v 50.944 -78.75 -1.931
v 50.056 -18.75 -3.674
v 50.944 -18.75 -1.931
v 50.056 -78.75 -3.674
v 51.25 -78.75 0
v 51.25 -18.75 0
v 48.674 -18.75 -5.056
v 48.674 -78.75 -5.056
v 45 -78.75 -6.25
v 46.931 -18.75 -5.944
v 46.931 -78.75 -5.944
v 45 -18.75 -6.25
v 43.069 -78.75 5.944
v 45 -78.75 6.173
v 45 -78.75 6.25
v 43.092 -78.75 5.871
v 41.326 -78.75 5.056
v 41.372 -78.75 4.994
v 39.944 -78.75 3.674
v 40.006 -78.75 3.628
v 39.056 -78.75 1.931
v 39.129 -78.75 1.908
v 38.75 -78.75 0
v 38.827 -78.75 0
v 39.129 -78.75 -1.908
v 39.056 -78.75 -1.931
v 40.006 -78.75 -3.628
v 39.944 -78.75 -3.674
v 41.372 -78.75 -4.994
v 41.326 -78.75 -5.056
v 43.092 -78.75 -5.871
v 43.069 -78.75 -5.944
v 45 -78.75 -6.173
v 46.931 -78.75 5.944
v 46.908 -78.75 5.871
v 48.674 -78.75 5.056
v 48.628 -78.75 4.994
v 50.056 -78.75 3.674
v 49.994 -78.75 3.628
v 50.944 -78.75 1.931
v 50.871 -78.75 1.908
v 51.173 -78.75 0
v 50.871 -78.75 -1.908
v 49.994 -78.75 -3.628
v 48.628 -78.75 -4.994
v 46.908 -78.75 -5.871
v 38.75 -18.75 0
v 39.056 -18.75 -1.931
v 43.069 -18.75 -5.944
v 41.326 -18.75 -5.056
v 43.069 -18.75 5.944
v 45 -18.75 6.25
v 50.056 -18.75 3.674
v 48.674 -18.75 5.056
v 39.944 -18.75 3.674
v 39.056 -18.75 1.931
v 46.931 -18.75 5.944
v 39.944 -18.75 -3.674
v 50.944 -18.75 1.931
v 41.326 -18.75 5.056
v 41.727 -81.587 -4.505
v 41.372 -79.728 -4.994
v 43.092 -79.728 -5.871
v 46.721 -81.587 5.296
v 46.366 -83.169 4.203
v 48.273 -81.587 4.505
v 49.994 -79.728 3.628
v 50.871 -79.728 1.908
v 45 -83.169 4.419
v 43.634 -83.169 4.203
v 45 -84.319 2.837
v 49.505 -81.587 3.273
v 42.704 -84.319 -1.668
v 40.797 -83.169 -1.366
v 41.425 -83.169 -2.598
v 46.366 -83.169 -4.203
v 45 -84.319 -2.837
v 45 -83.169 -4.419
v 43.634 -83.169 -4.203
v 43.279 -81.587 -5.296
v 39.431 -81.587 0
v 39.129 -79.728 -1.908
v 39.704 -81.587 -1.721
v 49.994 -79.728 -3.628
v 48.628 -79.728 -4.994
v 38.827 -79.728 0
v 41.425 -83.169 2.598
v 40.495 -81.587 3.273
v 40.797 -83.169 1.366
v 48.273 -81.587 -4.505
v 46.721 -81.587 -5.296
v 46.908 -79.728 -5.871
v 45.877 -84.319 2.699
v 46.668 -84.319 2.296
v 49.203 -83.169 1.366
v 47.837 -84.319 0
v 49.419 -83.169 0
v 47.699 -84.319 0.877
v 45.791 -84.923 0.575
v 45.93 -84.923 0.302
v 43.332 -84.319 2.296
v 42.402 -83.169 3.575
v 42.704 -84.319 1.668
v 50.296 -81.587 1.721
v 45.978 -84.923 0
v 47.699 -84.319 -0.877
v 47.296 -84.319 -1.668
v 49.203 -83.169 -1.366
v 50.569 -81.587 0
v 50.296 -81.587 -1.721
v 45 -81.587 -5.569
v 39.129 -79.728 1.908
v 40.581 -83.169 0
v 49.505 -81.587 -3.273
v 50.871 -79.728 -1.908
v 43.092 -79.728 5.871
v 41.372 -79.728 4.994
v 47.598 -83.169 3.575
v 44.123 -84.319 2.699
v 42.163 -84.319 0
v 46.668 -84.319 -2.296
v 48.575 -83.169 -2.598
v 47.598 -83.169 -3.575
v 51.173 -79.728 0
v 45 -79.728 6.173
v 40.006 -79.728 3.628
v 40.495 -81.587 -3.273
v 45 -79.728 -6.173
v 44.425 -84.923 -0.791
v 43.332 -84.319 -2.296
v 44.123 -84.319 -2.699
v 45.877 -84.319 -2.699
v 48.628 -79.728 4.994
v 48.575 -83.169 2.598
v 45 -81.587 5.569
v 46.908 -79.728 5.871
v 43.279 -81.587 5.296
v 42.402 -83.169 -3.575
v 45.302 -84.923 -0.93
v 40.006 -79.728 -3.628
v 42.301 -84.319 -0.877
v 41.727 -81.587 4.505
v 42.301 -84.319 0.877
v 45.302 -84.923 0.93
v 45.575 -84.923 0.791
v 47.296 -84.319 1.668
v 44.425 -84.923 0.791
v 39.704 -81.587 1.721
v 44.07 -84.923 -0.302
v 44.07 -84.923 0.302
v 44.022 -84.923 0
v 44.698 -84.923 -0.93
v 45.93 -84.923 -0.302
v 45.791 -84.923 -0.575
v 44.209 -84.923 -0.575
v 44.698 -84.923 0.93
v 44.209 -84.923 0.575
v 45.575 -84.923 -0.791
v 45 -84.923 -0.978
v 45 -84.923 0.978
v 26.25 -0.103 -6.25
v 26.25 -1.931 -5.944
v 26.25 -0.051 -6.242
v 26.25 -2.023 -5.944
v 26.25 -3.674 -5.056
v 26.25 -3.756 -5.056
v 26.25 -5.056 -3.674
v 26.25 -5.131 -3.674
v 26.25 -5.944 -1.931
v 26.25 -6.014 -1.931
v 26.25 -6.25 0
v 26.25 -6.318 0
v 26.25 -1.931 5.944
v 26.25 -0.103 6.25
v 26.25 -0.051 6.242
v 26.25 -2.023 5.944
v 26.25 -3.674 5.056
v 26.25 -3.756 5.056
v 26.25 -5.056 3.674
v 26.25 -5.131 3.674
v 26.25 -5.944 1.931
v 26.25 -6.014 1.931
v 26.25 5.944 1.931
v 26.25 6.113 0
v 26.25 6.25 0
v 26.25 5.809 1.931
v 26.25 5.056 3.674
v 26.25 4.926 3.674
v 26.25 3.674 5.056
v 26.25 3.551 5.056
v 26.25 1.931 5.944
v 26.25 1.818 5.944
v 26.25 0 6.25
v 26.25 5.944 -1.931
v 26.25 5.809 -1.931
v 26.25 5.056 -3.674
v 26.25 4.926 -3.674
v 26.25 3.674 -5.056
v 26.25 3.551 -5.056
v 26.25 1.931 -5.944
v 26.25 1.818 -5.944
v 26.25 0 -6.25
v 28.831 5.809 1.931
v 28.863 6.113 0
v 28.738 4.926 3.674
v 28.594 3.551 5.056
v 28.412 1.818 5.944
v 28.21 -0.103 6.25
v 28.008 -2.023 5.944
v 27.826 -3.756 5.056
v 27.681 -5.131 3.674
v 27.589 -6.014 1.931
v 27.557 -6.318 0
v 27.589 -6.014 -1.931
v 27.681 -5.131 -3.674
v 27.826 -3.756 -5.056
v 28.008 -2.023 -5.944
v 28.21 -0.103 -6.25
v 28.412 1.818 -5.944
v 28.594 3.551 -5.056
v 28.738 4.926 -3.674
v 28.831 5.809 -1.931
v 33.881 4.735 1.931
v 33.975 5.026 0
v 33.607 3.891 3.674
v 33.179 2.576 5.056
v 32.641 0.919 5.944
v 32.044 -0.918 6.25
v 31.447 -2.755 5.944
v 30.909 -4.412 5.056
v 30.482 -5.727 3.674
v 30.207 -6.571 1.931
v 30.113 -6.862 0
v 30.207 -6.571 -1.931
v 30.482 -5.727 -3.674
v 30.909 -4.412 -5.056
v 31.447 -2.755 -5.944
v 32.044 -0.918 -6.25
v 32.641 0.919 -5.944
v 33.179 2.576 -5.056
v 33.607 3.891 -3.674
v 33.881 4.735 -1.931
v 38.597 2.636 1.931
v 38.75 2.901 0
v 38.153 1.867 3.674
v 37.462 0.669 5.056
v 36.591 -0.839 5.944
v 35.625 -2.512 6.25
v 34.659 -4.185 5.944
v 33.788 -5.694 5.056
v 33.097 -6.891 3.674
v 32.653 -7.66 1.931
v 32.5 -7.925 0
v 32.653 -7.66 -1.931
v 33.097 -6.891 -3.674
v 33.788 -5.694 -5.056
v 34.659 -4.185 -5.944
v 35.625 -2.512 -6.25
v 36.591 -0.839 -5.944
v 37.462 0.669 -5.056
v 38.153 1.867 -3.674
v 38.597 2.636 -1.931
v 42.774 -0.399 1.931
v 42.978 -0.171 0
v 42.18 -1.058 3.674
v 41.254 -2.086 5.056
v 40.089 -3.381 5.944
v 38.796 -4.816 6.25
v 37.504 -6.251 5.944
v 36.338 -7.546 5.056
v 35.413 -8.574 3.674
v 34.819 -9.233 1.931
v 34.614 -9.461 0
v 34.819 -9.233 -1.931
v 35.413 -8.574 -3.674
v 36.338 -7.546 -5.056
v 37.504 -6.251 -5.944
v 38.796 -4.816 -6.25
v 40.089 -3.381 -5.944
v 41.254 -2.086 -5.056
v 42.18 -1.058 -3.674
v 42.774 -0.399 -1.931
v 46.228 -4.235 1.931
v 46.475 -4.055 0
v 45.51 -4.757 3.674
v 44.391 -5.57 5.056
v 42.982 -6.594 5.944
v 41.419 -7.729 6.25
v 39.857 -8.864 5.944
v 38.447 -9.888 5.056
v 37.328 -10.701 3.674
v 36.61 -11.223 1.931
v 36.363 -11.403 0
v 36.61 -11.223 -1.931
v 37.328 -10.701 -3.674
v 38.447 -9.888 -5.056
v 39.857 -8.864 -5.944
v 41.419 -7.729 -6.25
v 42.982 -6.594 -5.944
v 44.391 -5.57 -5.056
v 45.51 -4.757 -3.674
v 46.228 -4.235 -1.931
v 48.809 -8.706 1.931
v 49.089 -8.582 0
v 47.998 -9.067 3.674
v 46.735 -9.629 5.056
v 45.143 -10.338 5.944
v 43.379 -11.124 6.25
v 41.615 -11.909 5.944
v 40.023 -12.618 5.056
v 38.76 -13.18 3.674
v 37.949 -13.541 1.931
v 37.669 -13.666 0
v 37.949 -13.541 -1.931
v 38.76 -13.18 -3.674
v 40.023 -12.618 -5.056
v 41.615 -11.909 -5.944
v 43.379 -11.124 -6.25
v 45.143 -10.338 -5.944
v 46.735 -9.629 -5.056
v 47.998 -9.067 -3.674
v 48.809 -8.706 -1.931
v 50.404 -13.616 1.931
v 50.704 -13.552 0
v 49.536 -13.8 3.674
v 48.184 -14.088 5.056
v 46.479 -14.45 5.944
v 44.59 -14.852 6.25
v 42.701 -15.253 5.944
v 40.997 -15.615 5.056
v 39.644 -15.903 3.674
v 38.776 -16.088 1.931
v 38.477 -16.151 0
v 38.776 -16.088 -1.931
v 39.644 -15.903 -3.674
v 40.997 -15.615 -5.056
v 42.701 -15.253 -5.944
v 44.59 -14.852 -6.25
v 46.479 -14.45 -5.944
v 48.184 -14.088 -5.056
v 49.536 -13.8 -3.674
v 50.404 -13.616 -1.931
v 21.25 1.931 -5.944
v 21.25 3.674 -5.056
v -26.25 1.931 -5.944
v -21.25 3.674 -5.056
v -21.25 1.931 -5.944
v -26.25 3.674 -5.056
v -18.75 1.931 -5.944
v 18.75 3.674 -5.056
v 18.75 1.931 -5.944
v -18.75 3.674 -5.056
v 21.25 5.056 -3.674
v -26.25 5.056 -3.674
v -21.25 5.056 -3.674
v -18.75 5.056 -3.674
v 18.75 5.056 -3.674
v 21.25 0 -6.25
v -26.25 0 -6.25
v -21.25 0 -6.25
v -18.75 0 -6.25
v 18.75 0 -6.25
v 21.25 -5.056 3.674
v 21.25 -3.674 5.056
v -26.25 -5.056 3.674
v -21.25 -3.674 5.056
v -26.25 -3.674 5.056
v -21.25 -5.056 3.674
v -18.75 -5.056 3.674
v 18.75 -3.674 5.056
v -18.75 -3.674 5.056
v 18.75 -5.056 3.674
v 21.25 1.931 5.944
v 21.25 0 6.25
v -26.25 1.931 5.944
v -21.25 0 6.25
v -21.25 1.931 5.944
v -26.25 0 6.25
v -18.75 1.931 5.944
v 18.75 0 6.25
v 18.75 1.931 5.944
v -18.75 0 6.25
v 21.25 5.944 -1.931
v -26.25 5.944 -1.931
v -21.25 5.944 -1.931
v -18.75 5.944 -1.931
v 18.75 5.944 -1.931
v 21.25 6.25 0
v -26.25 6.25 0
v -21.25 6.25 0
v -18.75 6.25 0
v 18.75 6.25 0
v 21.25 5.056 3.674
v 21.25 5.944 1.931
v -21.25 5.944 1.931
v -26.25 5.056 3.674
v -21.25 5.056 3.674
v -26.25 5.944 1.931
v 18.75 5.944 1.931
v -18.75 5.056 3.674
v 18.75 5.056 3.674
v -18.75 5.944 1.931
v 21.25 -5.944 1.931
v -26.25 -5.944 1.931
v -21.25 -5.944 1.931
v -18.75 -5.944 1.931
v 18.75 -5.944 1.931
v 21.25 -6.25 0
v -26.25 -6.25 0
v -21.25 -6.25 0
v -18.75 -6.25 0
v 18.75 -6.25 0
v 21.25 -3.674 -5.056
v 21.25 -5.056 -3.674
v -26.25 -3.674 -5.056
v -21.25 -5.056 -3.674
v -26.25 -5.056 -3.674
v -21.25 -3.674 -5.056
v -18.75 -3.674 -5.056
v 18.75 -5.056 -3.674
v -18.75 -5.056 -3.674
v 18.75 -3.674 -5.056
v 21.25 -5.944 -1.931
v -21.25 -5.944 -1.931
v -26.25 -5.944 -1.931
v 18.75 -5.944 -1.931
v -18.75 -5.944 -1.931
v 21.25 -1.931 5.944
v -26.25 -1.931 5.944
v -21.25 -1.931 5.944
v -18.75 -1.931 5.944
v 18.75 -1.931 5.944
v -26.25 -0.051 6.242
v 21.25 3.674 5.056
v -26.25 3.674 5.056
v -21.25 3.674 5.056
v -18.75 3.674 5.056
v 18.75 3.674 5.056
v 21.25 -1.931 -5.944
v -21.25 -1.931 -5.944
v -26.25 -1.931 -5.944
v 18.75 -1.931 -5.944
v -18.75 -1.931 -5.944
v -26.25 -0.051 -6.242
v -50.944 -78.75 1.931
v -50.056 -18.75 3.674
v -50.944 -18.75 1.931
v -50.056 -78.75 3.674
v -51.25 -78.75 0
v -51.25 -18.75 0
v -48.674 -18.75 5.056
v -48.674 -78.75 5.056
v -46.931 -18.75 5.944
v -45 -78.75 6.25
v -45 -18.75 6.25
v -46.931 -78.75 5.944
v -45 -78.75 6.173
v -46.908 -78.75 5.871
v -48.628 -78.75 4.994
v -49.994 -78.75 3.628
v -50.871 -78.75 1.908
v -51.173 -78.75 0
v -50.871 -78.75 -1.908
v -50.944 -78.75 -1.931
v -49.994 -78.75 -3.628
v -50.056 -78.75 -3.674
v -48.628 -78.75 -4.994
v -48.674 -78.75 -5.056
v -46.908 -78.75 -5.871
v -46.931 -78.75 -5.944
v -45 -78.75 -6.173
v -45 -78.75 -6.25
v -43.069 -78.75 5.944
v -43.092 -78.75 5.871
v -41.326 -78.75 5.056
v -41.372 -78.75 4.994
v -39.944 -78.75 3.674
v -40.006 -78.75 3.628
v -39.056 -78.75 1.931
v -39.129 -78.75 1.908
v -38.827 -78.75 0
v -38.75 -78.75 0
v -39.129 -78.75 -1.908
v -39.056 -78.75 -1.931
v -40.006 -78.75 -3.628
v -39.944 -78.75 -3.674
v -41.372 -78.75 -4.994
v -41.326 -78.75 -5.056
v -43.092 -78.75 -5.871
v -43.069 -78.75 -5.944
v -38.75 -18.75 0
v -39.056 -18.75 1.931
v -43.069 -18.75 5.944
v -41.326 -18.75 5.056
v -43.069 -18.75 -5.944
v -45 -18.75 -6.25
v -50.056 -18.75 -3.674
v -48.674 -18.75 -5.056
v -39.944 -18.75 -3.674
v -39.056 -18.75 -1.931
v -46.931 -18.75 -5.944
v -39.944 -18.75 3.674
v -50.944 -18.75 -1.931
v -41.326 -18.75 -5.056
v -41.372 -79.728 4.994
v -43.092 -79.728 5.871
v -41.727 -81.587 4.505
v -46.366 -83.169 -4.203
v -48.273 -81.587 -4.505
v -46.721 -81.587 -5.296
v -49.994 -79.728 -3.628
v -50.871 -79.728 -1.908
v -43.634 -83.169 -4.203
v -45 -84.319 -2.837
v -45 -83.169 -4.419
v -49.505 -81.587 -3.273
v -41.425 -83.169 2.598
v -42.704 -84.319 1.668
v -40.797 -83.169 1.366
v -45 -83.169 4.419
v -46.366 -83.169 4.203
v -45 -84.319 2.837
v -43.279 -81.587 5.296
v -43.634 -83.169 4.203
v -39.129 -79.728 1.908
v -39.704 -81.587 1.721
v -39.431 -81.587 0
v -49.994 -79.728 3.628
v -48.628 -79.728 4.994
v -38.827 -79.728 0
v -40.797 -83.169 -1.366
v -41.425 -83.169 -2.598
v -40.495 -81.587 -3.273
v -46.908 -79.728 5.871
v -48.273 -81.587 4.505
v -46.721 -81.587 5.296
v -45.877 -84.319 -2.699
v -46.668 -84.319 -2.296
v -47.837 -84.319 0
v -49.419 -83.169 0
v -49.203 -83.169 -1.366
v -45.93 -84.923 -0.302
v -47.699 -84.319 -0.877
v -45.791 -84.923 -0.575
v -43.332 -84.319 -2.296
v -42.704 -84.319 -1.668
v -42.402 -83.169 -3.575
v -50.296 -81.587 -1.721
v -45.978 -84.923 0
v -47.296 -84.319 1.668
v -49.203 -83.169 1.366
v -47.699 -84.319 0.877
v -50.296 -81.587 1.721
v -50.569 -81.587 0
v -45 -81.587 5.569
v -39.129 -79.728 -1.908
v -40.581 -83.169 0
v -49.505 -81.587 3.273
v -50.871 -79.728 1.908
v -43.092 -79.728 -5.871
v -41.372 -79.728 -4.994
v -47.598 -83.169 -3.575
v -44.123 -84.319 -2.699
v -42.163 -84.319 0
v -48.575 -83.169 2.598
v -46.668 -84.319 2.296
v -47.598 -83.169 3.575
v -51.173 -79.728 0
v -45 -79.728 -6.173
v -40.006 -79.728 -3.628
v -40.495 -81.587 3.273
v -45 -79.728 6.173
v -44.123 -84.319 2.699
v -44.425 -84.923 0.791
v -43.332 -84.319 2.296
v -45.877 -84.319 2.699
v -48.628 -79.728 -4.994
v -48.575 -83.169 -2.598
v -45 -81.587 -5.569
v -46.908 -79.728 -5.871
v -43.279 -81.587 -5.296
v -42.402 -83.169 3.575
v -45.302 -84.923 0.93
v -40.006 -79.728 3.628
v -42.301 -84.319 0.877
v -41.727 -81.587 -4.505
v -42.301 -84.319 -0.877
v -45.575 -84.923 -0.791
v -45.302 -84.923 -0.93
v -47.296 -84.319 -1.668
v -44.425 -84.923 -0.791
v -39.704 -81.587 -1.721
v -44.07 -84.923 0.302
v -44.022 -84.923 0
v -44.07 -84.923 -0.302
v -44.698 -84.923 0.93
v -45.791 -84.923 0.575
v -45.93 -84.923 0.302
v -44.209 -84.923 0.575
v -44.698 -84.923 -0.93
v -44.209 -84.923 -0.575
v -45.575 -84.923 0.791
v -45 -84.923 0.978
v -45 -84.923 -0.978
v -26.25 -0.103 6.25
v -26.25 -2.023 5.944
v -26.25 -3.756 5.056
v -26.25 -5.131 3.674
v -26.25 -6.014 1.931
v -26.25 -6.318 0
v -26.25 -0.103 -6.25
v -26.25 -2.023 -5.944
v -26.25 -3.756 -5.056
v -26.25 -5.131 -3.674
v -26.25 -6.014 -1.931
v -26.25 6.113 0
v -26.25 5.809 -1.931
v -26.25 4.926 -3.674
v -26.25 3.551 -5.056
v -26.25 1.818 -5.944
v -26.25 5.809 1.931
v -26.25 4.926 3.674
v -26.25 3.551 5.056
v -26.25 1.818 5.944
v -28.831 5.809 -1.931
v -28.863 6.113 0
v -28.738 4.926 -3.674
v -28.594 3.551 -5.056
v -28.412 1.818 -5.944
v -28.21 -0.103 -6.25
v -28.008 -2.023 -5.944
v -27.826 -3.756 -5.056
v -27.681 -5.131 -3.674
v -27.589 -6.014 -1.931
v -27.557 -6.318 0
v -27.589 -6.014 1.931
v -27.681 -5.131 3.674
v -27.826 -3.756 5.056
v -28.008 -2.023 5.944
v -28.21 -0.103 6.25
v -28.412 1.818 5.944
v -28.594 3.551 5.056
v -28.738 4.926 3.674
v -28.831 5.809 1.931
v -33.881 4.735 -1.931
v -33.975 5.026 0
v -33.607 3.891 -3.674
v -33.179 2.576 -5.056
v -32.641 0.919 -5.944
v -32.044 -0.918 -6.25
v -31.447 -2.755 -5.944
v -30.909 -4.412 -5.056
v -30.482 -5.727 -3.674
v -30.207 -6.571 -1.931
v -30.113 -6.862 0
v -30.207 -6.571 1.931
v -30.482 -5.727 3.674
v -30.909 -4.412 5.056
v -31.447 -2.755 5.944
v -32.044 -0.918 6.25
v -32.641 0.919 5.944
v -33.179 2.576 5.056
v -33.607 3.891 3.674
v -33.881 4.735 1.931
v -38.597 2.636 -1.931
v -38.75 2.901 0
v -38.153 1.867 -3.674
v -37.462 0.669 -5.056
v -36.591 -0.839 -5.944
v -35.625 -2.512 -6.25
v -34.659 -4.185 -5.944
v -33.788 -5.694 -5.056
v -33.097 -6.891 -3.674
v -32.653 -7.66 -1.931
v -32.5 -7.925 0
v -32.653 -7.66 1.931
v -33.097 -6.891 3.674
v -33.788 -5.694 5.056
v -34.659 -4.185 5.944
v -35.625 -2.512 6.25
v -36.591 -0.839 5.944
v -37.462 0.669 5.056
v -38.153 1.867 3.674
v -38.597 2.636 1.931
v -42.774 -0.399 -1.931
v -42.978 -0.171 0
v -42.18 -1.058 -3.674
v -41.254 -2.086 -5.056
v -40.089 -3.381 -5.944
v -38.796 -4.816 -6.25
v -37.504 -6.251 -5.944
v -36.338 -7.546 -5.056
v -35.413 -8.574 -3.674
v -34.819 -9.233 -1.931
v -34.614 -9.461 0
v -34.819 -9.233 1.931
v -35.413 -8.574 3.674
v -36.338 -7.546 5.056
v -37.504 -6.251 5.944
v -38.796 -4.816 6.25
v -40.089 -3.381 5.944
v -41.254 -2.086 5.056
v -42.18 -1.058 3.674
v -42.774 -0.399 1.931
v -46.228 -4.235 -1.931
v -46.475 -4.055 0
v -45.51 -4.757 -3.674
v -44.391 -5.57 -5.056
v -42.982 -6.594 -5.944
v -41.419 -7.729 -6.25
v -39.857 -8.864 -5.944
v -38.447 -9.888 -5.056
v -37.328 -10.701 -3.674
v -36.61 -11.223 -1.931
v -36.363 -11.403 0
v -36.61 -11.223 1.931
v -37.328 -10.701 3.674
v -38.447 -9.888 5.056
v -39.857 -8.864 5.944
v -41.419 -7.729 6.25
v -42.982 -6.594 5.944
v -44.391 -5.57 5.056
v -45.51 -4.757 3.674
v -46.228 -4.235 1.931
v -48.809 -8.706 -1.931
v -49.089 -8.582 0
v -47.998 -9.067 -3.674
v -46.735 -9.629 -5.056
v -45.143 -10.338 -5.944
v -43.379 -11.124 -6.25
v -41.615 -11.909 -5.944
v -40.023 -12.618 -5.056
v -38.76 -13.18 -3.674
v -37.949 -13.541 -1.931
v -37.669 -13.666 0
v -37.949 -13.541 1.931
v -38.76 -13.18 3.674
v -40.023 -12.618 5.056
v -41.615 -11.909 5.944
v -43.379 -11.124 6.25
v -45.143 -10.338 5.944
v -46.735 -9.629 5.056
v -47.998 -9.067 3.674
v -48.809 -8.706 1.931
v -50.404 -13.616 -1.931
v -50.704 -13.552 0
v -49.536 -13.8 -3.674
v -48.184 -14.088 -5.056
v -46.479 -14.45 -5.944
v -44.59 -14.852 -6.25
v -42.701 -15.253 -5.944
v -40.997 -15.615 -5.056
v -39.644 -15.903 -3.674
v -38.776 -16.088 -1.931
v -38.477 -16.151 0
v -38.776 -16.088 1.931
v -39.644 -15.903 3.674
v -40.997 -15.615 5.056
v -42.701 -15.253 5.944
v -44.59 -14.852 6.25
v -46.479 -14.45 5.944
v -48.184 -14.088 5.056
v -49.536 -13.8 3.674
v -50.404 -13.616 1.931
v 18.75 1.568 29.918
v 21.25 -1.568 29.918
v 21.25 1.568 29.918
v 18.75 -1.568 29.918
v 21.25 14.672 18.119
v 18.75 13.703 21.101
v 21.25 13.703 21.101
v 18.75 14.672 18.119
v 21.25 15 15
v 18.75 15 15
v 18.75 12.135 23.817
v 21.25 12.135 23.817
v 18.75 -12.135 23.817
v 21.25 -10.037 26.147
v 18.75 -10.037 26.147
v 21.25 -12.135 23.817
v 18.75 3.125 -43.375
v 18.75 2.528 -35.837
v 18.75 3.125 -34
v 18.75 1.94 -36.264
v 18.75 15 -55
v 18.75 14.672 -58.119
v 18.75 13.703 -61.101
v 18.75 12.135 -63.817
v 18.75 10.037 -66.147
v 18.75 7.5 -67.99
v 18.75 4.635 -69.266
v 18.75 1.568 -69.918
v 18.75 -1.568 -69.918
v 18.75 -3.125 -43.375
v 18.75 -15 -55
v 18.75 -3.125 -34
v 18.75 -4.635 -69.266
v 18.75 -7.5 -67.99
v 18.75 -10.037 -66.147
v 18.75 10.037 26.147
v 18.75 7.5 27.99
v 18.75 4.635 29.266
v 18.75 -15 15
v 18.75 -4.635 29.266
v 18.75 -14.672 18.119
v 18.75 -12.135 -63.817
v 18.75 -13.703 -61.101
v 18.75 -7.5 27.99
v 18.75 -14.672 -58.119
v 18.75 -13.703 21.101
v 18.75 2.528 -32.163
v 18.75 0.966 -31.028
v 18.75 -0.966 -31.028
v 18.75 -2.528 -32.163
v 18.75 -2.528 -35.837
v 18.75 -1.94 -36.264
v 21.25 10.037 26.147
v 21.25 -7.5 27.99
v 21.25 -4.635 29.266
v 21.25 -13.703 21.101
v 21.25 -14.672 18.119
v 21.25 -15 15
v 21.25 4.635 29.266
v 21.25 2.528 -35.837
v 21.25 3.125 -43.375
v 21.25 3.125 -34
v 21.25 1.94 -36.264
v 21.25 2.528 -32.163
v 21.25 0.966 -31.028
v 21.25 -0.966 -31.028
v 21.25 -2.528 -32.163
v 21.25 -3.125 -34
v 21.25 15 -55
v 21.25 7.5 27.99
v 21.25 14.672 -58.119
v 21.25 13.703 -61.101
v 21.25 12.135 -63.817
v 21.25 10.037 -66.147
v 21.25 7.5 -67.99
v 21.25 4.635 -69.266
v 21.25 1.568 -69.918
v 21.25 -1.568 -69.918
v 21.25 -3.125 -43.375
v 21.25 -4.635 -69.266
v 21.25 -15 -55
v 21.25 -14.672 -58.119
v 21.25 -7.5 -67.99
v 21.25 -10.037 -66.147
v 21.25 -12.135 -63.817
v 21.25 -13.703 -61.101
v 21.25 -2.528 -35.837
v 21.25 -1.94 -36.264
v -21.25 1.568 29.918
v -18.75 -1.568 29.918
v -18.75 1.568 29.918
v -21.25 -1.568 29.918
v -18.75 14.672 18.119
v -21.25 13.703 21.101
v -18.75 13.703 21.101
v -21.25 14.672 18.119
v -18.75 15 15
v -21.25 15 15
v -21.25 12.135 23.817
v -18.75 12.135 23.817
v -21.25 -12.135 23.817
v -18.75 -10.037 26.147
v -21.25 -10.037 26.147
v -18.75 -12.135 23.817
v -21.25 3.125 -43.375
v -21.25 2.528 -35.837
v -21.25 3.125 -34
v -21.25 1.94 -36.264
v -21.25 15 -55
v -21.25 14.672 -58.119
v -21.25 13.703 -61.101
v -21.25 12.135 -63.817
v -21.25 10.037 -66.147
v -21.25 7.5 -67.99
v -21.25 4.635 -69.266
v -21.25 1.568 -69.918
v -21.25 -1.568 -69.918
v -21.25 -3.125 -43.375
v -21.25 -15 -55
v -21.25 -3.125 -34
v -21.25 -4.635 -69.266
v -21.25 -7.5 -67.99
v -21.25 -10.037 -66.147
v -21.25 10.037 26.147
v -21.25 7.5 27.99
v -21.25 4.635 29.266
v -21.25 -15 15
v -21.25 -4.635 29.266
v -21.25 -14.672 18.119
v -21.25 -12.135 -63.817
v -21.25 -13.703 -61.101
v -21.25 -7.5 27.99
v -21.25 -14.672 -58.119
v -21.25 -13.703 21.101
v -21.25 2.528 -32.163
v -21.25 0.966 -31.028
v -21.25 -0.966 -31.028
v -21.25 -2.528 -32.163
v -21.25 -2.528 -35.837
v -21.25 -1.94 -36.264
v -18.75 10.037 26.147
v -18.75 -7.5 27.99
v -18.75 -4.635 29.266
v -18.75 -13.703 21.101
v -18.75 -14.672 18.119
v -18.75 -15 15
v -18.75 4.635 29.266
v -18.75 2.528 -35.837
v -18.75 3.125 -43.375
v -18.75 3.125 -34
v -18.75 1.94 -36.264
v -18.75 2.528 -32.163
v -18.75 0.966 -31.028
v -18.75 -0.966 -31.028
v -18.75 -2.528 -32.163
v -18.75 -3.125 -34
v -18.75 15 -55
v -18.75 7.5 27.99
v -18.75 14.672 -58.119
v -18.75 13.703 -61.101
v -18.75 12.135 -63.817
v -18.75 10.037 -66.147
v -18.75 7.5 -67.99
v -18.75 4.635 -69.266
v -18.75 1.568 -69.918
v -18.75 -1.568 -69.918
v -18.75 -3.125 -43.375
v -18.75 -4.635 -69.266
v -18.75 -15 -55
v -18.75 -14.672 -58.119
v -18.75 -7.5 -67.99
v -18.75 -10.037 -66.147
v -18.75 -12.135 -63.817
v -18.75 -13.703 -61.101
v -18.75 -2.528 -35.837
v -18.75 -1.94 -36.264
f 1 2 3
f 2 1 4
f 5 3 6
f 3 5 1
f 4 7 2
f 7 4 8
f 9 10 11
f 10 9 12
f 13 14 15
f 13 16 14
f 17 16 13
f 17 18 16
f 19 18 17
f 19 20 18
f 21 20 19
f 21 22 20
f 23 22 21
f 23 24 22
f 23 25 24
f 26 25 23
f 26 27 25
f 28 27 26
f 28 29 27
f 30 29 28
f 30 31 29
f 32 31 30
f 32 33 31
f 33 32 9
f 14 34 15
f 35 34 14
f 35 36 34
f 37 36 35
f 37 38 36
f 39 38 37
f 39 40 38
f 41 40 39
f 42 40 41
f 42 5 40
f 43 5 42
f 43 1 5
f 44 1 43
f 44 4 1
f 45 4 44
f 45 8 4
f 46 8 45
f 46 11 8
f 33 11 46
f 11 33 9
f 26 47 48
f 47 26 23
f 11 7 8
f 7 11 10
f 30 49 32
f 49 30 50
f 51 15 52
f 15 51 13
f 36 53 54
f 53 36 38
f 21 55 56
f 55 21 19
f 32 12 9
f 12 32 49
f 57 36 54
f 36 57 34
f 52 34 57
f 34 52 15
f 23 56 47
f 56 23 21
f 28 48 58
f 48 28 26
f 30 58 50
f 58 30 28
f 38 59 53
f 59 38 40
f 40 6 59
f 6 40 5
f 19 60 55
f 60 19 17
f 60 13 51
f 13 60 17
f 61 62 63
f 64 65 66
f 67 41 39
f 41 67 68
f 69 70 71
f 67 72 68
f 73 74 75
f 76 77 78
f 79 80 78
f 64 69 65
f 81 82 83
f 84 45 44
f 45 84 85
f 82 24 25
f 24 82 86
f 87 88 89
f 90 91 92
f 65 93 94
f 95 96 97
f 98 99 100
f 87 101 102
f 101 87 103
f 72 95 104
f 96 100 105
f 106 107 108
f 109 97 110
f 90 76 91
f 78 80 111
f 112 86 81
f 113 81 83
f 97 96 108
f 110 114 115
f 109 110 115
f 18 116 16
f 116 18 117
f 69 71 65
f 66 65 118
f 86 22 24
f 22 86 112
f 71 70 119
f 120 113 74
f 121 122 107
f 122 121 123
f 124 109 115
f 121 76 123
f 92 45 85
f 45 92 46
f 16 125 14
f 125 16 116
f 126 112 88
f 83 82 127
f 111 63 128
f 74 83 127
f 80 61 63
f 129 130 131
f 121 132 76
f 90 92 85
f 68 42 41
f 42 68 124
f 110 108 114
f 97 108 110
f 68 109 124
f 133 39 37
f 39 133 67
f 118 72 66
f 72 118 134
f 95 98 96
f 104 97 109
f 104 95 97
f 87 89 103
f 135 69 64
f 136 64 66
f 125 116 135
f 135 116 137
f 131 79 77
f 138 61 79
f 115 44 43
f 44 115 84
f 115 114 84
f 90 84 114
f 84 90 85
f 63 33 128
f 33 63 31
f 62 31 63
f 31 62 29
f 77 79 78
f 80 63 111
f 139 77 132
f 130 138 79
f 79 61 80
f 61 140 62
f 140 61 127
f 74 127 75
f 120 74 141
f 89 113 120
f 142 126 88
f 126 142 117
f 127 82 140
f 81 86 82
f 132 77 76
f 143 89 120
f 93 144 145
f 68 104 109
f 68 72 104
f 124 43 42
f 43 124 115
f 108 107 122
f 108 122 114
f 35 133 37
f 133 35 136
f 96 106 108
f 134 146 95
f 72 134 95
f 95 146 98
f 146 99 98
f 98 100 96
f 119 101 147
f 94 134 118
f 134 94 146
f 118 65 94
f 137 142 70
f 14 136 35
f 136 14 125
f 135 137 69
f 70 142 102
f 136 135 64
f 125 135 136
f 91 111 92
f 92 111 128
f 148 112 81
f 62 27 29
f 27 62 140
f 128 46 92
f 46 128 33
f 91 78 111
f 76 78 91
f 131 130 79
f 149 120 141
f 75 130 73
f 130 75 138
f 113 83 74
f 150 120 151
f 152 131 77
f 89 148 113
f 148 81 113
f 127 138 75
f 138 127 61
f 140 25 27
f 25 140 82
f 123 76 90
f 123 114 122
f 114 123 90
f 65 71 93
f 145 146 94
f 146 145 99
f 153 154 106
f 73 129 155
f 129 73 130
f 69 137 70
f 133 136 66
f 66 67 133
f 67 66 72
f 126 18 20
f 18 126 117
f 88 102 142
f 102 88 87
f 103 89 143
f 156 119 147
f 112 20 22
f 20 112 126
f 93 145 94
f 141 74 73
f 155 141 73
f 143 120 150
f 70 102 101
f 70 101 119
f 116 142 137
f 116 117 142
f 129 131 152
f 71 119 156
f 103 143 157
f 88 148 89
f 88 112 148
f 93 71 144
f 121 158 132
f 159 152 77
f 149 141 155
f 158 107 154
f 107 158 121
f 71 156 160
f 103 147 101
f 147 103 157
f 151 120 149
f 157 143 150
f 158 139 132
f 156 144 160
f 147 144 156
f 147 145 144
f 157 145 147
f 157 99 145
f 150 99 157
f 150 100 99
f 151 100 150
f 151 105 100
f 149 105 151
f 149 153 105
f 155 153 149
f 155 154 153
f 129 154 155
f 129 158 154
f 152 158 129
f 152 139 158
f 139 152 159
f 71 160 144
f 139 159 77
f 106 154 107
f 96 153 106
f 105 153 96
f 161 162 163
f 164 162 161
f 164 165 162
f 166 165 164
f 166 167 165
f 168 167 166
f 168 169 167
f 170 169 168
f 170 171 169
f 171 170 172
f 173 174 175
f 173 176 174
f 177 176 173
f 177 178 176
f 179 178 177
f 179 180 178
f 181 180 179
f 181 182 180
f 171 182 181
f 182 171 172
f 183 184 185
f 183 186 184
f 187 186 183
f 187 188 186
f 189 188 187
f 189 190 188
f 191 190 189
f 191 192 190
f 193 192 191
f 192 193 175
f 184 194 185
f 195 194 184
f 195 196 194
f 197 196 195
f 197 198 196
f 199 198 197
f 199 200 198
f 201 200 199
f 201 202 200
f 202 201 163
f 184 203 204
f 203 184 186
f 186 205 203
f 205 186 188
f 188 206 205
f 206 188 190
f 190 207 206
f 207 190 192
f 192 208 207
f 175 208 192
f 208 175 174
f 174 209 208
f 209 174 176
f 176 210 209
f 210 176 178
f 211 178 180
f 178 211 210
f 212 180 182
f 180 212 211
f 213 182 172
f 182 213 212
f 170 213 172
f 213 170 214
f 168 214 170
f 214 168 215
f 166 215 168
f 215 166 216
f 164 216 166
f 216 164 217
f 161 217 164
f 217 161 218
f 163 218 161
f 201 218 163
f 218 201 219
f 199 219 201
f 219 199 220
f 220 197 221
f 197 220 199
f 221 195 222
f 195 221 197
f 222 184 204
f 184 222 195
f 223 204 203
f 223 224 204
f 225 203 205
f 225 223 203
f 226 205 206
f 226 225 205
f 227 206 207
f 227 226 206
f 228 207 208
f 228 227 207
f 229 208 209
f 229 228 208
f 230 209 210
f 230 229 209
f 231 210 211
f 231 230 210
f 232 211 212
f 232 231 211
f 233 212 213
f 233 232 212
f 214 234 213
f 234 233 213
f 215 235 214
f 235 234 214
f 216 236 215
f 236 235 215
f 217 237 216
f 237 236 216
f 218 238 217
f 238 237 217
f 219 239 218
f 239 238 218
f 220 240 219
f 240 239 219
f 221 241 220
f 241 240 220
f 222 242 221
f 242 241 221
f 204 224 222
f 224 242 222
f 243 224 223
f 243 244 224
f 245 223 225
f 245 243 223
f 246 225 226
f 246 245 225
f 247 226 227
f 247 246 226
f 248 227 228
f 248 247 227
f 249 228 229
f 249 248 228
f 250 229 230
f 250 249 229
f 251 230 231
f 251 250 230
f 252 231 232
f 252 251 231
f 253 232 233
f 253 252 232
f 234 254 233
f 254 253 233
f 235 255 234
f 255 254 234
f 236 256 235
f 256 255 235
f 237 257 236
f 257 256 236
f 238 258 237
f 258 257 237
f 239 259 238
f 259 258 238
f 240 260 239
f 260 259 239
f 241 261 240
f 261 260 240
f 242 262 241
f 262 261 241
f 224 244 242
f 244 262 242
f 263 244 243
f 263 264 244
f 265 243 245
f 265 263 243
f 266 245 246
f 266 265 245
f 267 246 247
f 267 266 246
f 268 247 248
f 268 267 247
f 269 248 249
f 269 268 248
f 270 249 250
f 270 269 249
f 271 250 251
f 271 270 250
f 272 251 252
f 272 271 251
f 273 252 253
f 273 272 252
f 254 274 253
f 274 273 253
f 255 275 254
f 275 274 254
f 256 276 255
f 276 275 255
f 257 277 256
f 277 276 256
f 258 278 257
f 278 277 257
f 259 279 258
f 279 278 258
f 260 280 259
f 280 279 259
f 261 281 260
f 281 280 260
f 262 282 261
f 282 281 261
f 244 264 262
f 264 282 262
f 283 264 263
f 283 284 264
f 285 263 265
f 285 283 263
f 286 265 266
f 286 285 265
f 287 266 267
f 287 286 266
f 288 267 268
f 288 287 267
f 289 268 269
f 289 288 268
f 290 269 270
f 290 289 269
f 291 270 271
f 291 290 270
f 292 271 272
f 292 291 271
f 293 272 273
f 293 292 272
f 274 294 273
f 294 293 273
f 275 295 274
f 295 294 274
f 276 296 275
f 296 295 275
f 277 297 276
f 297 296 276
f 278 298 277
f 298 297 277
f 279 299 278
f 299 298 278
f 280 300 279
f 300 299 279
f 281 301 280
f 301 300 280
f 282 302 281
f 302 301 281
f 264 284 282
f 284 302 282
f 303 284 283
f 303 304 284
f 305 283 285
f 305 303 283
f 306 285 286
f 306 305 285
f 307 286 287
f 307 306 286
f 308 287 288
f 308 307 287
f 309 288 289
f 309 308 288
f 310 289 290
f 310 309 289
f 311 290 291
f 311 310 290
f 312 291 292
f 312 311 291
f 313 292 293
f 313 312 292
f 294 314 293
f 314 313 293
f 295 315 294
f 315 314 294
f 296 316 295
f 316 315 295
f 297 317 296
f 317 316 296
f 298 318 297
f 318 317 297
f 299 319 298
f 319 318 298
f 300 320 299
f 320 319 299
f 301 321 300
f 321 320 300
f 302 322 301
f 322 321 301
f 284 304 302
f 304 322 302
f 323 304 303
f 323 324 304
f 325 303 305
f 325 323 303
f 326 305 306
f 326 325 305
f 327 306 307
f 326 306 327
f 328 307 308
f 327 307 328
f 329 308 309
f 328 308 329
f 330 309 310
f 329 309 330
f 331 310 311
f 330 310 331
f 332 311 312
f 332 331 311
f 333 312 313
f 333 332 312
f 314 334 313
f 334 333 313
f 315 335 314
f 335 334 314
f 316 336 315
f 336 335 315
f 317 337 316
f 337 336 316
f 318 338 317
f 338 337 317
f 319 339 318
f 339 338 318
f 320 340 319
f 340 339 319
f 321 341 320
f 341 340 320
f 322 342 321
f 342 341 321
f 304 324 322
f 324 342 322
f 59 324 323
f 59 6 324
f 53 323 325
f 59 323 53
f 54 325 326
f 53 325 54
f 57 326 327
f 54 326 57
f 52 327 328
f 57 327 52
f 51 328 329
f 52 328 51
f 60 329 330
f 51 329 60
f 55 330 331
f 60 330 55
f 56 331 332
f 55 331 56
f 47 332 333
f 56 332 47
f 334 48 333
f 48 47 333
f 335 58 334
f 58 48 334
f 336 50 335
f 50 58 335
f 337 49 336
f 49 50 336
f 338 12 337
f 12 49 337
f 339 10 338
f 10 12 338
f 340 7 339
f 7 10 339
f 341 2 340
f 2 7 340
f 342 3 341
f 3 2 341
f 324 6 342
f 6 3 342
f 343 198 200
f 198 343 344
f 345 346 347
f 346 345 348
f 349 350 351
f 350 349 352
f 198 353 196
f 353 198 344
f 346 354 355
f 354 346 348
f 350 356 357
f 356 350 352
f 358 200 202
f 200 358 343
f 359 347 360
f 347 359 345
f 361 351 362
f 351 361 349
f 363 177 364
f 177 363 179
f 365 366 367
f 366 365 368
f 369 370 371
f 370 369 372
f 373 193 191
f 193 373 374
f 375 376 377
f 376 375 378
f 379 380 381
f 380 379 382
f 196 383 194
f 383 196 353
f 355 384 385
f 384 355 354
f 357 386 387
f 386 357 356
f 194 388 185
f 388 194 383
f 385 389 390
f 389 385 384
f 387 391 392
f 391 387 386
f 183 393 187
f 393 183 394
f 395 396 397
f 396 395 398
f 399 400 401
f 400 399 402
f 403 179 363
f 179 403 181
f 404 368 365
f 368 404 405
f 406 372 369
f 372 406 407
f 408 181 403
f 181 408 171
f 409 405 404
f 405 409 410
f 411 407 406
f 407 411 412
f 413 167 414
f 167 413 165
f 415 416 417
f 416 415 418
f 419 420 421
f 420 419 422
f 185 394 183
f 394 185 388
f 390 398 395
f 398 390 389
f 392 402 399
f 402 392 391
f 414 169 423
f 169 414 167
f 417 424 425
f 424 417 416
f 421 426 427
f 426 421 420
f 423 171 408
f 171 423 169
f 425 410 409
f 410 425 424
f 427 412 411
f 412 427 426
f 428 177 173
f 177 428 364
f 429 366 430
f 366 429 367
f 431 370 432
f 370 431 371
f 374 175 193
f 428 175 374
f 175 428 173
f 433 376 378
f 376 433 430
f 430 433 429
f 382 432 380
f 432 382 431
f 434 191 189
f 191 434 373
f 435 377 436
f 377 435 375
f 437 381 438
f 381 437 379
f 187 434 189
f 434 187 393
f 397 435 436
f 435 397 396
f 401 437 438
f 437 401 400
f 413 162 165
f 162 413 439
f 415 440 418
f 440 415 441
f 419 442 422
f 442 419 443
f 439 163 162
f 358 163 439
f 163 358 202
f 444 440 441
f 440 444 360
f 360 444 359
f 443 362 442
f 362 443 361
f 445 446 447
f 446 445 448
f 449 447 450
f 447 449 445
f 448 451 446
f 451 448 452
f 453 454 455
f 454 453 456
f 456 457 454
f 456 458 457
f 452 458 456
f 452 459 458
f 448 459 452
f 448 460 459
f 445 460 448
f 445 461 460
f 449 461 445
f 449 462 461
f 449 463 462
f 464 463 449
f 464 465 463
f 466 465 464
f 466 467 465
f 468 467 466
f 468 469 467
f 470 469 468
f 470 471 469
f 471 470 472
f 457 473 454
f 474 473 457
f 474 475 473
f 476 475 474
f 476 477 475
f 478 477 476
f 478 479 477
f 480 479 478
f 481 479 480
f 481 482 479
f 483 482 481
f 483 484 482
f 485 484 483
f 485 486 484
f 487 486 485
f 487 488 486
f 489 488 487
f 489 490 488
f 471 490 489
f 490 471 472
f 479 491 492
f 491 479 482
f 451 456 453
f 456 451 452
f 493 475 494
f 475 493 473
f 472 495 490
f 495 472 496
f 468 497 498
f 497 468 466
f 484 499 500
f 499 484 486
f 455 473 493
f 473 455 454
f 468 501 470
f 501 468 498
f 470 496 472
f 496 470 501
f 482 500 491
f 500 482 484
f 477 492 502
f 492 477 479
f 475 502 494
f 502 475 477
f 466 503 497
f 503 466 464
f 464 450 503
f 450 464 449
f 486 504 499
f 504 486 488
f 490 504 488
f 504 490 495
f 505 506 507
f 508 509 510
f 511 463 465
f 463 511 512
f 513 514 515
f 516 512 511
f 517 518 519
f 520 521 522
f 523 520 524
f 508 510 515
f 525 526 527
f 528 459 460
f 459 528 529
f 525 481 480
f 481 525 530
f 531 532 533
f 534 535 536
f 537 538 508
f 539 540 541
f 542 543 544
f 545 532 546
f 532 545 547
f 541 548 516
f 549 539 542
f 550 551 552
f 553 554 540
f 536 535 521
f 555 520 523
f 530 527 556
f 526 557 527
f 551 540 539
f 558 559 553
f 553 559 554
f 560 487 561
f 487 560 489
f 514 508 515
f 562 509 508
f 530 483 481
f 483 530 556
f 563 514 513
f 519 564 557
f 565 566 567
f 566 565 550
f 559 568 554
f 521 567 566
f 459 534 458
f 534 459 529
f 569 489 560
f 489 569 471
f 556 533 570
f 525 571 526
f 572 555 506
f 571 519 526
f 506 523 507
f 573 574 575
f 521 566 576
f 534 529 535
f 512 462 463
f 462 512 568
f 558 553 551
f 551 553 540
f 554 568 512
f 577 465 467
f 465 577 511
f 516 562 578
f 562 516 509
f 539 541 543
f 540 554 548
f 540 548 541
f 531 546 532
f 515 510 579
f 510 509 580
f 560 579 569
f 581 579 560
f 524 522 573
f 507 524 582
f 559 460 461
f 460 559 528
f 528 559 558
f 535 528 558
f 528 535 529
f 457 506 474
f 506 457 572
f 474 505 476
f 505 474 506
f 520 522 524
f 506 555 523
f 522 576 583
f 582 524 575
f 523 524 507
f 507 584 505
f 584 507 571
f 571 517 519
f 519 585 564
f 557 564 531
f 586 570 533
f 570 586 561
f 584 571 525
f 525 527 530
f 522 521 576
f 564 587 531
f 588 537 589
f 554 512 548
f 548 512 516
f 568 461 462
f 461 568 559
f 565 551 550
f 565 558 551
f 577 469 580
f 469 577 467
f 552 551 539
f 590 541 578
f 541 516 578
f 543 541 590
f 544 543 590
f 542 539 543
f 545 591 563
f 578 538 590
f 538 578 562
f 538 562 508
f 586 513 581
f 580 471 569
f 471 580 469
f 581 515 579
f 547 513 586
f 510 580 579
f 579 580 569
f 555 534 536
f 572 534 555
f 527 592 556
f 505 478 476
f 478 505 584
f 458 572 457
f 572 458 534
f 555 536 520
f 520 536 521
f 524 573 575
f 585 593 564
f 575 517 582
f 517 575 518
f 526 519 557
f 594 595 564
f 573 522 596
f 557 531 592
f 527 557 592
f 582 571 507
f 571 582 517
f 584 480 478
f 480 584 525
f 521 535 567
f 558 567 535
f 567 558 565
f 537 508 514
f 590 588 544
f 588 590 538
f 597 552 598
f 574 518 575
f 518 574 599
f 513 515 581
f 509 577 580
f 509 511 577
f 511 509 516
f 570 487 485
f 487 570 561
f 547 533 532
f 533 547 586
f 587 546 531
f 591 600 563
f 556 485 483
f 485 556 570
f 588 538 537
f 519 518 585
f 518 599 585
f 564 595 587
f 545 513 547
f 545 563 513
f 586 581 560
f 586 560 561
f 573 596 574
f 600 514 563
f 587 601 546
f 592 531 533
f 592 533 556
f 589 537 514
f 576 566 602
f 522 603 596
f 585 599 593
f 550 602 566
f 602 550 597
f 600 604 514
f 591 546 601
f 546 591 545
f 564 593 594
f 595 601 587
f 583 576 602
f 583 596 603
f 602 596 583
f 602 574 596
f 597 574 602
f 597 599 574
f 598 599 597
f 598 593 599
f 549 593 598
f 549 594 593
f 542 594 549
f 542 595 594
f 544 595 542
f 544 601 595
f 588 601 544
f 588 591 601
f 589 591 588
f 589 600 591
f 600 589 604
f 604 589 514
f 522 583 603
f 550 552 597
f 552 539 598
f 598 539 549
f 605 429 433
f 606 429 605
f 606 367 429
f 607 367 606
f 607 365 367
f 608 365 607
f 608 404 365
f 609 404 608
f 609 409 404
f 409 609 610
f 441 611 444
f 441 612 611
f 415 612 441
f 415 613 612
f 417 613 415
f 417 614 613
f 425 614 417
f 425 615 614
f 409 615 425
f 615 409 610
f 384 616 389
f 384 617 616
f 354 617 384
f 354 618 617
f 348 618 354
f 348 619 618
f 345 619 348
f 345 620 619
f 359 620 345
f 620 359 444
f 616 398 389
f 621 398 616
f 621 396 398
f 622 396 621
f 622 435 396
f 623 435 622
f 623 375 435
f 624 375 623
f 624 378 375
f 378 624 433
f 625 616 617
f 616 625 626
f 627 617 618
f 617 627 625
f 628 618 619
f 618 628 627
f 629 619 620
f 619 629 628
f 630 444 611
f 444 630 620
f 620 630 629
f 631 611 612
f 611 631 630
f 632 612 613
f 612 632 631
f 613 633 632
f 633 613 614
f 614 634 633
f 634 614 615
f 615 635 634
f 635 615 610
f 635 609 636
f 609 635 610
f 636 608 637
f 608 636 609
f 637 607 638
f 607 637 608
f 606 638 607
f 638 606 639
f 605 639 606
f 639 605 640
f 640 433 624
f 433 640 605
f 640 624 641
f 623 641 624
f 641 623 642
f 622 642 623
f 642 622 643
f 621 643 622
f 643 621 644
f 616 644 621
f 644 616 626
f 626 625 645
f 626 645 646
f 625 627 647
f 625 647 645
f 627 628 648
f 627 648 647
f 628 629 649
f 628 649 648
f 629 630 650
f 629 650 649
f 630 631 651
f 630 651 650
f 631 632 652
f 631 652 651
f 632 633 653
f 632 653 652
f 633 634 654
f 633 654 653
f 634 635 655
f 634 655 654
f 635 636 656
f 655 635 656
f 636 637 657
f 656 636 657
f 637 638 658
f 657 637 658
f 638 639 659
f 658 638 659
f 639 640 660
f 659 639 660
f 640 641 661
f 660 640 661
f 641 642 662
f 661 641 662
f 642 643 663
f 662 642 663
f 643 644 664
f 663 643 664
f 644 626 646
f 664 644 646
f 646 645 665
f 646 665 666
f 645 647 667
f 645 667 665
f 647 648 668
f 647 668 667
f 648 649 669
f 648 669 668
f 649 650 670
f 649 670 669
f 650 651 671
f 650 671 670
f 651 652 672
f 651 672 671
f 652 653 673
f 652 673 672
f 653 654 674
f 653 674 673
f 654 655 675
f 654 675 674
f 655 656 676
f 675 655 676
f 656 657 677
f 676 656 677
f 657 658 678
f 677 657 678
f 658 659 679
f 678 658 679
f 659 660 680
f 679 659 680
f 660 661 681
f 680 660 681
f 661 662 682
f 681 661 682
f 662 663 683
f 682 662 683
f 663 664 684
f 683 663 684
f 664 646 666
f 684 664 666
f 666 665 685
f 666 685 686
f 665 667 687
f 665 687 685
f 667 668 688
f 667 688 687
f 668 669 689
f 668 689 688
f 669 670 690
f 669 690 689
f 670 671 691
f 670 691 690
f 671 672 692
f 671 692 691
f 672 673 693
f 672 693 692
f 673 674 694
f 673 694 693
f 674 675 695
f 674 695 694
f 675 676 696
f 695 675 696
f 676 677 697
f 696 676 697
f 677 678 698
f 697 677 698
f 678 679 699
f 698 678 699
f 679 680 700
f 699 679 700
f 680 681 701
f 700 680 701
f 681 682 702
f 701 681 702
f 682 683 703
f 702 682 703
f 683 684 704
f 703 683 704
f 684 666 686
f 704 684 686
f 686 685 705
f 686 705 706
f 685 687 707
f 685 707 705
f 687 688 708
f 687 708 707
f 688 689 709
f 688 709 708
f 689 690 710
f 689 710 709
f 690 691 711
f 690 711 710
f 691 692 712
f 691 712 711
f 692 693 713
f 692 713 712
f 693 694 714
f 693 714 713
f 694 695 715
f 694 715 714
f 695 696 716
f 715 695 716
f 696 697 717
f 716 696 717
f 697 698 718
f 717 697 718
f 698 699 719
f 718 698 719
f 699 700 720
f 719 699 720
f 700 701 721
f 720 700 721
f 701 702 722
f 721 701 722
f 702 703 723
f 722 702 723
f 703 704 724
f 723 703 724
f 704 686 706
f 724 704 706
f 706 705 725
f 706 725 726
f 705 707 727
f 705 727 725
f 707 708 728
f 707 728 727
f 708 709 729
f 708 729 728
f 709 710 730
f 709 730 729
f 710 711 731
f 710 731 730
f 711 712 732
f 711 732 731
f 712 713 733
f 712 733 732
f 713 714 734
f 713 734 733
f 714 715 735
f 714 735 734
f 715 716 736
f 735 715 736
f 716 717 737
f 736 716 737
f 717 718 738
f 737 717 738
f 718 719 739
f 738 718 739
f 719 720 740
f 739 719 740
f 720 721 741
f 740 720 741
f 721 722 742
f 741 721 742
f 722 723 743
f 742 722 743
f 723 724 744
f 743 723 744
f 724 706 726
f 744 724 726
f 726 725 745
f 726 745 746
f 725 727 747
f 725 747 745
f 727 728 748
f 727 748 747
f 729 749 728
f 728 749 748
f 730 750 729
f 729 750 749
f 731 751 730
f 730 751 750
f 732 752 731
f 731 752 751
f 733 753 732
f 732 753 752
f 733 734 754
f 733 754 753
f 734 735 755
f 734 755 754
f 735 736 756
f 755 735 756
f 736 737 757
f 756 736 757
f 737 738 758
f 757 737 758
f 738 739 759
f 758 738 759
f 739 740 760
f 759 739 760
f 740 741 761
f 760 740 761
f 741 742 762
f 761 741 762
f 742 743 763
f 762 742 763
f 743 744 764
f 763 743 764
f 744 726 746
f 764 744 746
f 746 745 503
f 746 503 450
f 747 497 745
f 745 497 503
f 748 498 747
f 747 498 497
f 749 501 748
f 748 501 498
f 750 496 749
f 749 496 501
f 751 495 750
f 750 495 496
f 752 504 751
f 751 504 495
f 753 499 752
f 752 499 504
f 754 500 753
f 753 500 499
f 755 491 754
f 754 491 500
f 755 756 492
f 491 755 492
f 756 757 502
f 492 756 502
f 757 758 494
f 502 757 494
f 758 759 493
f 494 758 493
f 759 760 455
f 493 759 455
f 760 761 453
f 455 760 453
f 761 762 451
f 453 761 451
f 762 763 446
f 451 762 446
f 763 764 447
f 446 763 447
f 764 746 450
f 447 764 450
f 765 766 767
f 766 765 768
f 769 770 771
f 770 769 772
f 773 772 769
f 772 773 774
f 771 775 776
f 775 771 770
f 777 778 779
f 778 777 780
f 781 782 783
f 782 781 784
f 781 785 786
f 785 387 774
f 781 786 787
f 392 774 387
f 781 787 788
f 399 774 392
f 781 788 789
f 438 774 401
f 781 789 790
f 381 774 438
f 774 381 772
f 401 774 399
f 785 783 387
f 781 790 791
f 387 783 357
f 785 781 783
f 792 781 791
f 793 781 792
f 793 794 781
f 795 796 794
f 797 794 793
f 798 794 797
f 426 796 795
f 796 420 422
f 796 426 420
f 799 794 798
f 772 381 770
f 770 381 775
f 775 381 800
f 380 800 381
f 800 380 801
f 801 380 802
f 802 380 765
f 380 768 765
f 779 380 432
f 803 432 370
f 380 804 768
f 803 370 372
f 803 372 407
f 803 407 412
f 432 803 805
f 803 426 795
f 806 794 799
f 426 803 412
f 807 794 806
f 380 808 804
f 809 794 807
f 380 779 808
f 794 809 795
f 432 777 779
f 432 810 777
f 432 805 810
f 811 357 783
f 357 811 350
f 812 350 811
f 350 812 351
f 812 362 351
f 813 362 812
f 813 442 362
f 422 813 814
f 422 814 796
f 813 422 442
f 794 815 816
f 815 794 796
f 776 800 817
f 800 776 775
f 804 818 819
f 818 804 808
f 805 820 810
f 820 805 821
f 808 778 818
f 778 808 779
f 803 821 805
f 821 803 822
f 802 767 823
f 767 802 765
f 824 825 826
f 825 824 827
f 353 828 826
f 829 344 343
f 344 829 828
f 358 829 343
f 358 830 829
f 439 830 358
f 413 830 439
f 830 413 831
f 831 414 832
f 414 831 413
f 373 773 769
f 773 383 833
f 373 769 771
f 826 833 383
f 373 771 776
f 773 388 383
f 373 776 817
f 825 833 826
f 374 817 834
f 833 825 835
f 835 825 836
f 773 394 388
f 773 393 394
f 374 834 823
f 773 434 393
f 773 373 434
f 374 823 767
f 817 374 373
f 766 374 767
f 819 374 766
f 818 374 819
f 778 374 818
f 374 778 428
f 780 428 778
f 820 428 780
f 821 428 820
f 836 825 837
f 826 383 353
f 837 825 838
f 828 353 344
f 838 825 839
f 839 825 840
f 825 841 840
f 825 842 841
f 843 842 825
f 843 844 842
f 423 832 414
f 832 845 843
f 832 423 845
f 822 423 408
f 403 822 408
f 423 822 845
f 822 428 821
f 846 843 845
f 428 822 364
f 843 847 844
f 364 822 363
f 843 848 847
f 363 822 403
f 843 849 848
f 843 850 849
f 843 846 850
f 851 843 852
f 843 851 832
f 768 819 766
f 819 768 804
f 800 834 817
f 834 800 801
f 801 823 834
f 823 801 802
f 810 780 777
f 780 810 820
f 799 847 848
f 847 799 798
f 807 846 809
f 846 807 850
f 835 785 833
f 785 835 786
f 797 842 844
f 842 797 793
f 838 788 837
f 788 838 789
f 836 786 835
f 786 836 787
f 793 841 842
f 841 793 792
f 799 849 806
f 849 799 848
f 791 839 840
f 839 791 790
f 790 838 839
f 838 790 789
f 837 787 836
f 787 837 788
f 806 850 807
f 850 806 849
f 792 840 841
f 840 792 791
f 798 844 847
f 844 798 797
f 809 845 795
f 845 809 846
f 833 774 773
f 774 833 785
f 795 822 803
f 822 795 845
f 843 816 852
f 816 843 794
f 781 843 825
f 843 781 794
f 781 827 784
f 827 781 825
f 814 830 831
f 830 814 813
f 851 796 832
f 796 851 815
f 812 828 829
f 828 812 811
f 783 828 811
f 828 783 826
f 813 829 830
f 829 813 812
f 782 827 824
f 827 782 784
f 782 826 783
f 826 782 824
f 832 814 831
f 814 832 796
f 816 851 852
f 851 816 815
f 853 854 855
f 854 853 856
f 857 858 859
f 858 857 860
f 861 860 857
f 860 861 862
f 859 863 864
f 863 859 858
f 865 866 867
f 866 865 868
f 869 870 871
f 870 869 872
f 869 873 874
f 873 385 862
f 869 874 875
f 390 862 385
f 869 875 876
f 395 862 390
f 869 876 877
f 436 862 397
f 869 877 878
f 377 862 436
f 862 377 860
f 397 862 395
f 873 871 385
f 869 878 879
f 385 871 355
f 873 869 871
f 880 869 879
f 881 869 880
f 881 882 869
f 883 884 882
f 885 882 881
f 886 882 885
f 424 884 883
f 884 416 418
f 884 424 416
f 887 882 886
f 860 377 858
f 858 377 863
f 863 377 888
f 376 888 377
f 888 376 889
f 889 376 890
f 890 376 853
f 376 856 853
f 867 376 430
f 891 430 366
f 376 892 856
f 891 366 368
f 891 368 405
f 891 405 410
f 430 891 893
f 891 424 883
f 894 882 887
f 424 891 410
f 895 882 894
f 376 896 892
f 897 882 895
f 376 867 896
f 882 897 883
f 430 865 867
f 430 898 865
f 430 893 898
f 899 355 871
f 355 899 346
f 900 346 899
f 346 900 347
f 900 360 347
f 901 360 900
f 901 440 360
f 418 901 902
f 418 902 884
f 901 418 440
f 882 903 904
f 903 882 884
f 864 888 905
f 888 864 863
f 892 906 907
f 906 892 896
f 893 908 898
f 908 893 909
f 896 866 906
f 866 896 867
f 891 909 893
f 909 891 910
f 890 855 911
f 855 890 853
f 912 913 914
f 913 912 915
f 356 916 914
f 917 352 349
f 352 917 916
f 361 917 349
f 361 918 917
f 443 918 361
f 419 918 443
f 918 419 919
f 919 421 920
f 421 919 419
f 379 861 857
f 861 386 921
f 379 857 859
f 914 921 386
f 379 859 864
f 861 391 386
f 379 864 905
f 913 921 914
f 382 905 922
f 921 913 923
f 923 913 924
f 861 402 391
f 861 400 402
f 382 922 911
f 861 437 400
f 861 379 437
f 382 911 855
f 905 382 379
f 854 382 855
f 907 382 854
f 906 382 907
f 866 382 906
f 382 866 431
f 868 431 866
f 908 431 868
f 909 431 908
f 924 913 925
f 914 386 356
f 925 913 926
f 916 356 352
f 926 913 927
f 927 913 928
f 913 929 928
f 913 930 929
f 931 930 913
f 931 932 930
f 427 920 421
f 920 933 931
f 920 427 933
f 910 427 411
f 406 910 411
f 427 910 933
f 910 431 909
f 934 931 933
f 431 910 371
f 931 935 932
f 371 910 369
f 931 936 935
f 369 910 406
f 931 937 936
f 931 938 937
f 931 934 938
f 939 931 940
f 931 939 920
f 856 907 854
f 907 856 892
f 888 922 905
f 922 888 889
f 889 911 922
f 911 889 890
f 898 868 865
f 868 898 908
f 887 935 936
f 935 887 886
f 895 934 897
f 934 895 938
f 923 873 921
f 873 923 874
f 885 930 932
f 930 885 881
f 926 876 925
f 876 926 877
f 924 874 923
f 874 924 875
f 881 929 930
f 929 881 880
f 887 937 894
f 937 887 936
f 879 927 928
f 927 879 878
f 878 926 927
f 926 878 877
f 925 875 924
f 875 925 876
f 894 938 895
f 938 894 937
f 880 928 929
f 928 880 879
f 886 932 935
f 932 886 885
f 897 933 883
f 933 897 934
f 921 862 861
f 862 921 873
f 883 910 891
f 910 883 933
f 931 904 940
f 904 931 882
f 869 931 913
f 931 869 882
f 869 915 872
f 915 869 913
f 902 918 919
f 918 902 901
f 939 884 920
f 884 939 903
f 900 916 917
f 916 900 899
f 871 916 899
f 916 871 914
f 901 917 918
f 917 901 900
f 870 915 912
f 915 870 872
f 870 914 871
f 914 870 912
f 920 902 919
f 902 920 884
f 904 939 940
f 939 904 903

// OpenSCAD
size=100;
door_thickness=40;


module doorhandle(s=size, dt=door_thickness){
    
    pl=s;//plate_length
    pw=0.3*s;//plate_width
    pt=s/40;//plate_thickness 
    kr=s/32; //keyhole_radius
    hr=s/16; //handle_radius
    hl=0.6*s; //handle_length
    
    module keyhole_punch() {
        translate([0,0,-pt/2])
        union() {
            linear_extrude(2*pt)
                polygon([[-kr,-kr*3],[kr,-kr*3],[0.5*kr,0],[-0.5*kr,0]]);
            cylinder(2*pt,kr,kr);
        }
    }
    module plate() {
        translate([-pw/2,-0.7*pl,-pt/2])
        difference() {
            union(){
                translate([pw/2,pl-pw/2,0])
                    cylinder(pt,pw/2,pw/2);
                translate([pw/2,pw/2,0])
                    cylinder(pt,pw/2,pw/2);
                translate([0,pw/2,0])
                    cube([pw,pl-pw,pt]);
            }
        translate([pw/2,pw*1.2,0])
            keyhole_punch();
        }
    }
    
   module handle() {
       union() {
           rotate([0,90,0])
           cylinder(hr+dt/2,hr,hr);
               translate([hr+dt/2,-3*hr,0])
           union() {
               translate([3*hr,-hl,0])
                   rotate([270,0,0])
                   union() {
                       cylinder(hl,hr,hr);
                       sphere(hr);
                   }
               intersection() {
                   translate([0,0,-3*hr])
                       cube([6*hr,6*hr,6*hr]);
                   rotate_extrude()
                       translate([3*hr, 0]) circle(hr);
               }
           }
       }
   }
   union() {
       handle();
           rotate([0,180,0])
                handle();
           rotate([90,0,90])
           union(){ 
                translate([0,0,dt/2])    
                plate();
                translate([0,0,-dt/2])     
                plate();
           }
   }

   
}


doorhandle();
